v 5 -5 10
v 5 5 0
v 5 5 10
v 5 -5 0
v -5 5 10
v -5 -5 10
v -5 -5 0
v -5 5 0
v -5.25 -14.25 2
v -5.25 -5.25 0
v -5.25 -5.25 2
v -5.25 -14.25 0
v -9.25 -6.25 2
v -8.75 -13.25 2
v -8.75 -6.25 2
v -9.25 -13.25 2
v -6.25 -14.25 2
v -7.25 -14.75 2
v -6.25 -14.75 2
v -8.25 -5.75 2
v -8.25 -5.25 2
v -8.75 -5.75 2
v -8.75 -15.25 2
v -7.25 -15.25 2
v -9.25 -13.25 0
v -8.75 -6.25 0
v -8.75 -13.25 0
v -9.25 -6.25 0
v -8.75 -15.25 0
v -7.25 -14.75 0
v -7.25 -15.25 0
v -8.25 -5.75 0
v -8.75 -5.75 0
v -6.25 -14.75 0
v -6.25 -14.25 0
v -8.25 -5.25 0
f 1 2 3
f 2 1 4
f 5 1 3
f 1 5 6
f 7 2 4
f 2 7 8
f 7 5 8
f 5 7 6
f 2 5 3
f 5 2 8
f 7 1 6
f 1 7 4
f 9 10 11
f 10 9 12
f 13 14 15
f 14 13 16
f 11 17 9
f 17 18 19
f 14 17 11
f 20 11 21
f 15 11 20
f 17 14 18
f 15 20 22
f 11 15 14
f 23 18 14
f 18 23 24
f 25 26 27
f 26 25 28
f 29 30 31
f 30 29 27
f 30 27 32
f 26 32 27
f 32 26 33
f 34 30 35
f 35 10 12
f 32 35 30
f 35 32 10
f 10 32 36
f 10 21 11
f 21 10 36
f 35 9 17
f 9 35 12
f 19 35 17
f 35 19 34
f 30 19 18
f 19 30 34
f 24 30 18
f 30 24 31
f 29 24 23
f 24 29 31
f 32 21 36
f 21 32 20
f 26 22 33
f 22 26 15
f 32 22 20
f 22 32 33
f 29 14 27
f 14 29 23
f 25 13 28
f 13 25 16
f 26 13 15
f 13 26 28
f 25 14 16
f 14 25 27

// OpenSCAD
translate([0, 0, 5]) color([0,1,0,0.9]) cube([10, 10, 10], center=true);
translate([-5.5, -5.5, 1]) color([1,0,0]) cube([0.5, 0.5, 2], center=true);
translate([-5.5, -6.0, 1]) color([1,0,0]) cube([0.5, 0.5, 2], center=true);
translate([-5.5, -6.5, 1]) color([1,0,0]) cube([0.5, 0.5, 2], center=true);
translate([-5.5, -7.0, 1]) color([1,0,0]) cube([0.5, 0.5, 2], center=true);
translate([-5.5, -7.5, 1]) color([1,0,0]) cube([0.5, 0.5, 2], center=true);
translate([-5.5, -8.0, 1]) color([1,0,0]) cube([0.5, 0.5, 2], center=true);
translate([-5.5, -8.5, 1]) color([1,0,0]) cube([0.5, 0.5, 2], center=true);
translate([-5.5, -9.0, 1]) color([1,0,0]) cube([0.5, 0.5, 2], center=true);
translate([-5.5, -9.5, 1]) color([1,0,0]) cube([0.5, 0.5, 2], center=true);
translate([-5.5, -10.0, 1]) color([1,0,0]) cube([0.5, 0.5, 2], center=true);
translate([-5.5, -10.5, 1]) color([1,0,0]) cube([0.5, 0.5, 2], center=true);
translate([-5.5, -11.0, 1]) color([1,0,0]) cube([0.5, 0.5, 2], center=true);
translate([-5.5, -11.5, 1]) color([1,0,0]) cube([0.5, 0.5, 2], center=true);
translate([-5.5, -12.0, 1]) color([1,0,0]) cube([0.5, 0.5, 2], center=true);
translate([-5.5, -12.5, 1]) color([1,0,0]) cube([0.5, 0.5, 2], center=true);
translate([-5.5, -13.0, 1]) color([1,0,0]) cube([0.5, 0.5, 2], center=true);
translate([-5.5, -13.5, 1]) color([1,0,0]) cube([0.5, 0.5, 2], center=true);
translate([-5.5, -14.0, 1]) color([1,0,0]) cube([0.5, 0.5, 2], center=true);
translate([-6.0, -5.5, 1]) color([1,0,0]) cube([0.5, 0.5, 2], center=true);
translate([-6.0, -6.0, 1]) color([1,0,0]) cube([0.5, 0.5, 2], center=true);
translate([-6.0, -6.5, 1]) color([1,0,0]) cube([0.5, 0.5, 2], center=true);
translate([-6.0, -7.0, 1]) color([1,0,0]) cube([0.5, 0.5, 2], center=true);
translate([-6.0, -7.5, 1]) color([1,0,0]) cube([0.5, 0.5, 2], center=true);
translate([-6.0, -8.0, 1]) color([1,0,0]) cube([0.5, 0.5, 2], center=true);
translate([-6.0, -8.5, 1]) color([1,0,0]) cube([0.5, 0.5, 2], center=true);
translate([-6.0, -9.0, 1]) color([1,0,0]) cube([0.5, 0.5, 2], center=true);
translate([-6.0, -9.5, 1]) color([1,0,0]) cube([0.5, 0.5, 2], center=true);
translate([-6.0, -10.0, 1]) color([1,0,0]) cube([0.5, 0.5, 2], center=true);
translate([-6.0, -10.5, 1]) color([1,0,0]) cube([0.5, 0.5, 2], center=true);
translate([-6.0, -11.0, 1]) color([1,0,0]) cube([0.5, 0.5, 2], center=true);
translate([-6.0, -11.5, 1]) color([1,0,0]) cube([0.5, 0.5, 2], center=true);
translate([-6.0, -12.0, 1]) color([1,0,0]) cube([0.5, 0.5, 2], center=true);
translate([-6.0, -12.5, 1]) color([1,0,0]) cube([0.5, 0.5, 2], center=true);
translate([-6.0, -13.0, 1]) color([1,0,0]) cube([0.5, 0.5, 2], center=true);
translate([-6.0, -13.5, 1]) color([1,0,0]) cube([0.5, 0.5, 2], center=true);
translate([-6.0, -14.0, 1]) color([1,0,0]) cube([0.5, 0.5, 2], center=true);
translate([-6.5, -5.5, 1]) color([1,0,0]) cube([0.5, 0.5, 2], center=true);
translate([-6.5, -6.0, 1]) color([1,0,0]) cube([0.5, 0.5, 2], center=true);
translate([-6.5, -6.5, 1]) color([1,0,0]) cube([0.5, 0.5, 2], center=true);
translate([-6.5, -7.0, 1]) color([1,0,0]) cube([0.5, 0.5, 2], center=true);
translate([-6.5, -7.5, 1]) color([1,0,0]) cube([0.5, 0.5, 2], center=true);
translate([-6.5, -8.0, 1]) color([1,0,0]) cube([0.5, 0.5, 2], center=true);
translate([-6.5, -8.5, 1]) color([1,0,0]) cube([0.5, 0.5, 2], center=true);
translate([-6.5, -9.0, 1]) color([1,0,0]) cube([0.5, 0.5, 2], center=true);
translate([-6.5, -9.5, 1]) color([1,0,0]) cube([0.5, 0.5, 2], center=true);
translate([-6.5, -10.0, 1]) color([1,0,0]) cube([0.5, 0.5, 2], center=true);
translate([-6.5, -10.5, 1]) color([1,0,0]) cube([0.5, 0.5, 2], center=true);
translate([-6.5, -11.0, 1]) color([1,0,0]) cube([0.5, 0.5, 2], center=true);
translate([-6.5, -11.5, 1]) color([1,0,0]) cube([0.5, 0.5, 2], center=true);
translate([-6.5, -12.0, 1]) color([1,0,0]) cube([0.5, 0.5, 2], center=true);
translate([-6.5, -12.5, 1]) color([1,0,0]) cube([0.5, 0.5, 2], center=true);
translate([-6.5, -13.0, 1]) color([1,0,0]) cube([0.5, 0.5, 2], center=true);
translate([-6.5, -13.5, 1]) color([1,0,0]) cube([0.5, 0.5, 2], center=true);
translate([-6.5, -14.0, 1]) color([1,0,0]) cube([0.5, 0.5, 2], center=true);
translate([-6.5, -14.5, 1]) color([1,0,0]) cube([0.5, 0.5, 2], center=true);
translate([-7.0, -5.5, 1]) color([1,0,0]) cube([0.5, 0.5, 2], center=true);
translate([-7.0, -6.0, 1]) color([1,0,0]) cube([0.5, 0.5, 2], center=true);
translate([-7.0, -6.5, 1]) color([1,0,0]) cube([0.5, 0.5, 2], center=true);
translate([-7.0, -7.0, 1]) color([1,0,0]) cube([0.5, 0.5, 2], center=true);
translate([-7.0, -7.5, 1]) color([1,0,0]) cube([0.5, 0.5, 2], center=true);
translate([-7.0, -8.0, 1]) color([1,0,0]) cube([0.5, 0.5, 2], center=true);
translate([-7.0, -8.5, 1]) color([1,0,0]) cube([0.5, 0.5, 2], center=true);
translate([-7.0, -9.0, 1]) color([1,0,0]) cube([0.5, 0.5, 2], center=true);
translate([-7.0, -9.5, 1]) color([1,0,0]) cube([0.5, 0.5, 2], center=true);
translate([-7.0, -10.0, 1]) color([1,0,0]) cube([0.5, 0.5, 2], center=true);
translate([-7.0, -10.5, 1]) color([1,0,0]) cube([0.5, 0.5, 2], center=true);
translate([-7.0, -11.0, 1]) color([1,0,0]) cube([0.5, 0.5, 2], center=true);
translate([-7.0, -11.5, 1]) color([1,0,0]) cube([0.5, 0.5, 2], center=true);
translate([-7.0, -12.0, 1]) color([1,0,0]) cube([0.5, 0.5, 2], center=true);
translate([-7.0, -12.5, 1]) color([1,0,0]) cube([0.5, 0.5, 2], center=true);
translate([-7.0, -13.0, 1]) color([1,0,0]) cube([0.5, 0.5, 2], center=true);
translate([-7.0, -13.5, 1]) color([1,0,0]) cube([0.5, 0.5, 2], center=true);
translate([-7.0, -14.0, 1]) color([1,0,0]) cube([0.5, 0.5, 2], center=true);
translate([-7.0, -14.5, 1]) color([1,0,0]) cube([0.5, 0.5, 2], center=true);
translate([-7.5, -5.5, 1]) color([1,0,0]) cube([0.5, 0.5, 2], center=true);
translate([-7.5, -6.0, 1]) color([1,0,0]) cube([0.5, 0.5, 2], center=true);
translate([-7.5, -6.5, 1]) color([1,0,0]) cube([0.5, 0.5, 2], center=true);
translate([-7.5, -7.0, 1]) color([1,0,0]) cube([0.5, 0.5, 2], center=true);
translate([-7.5, -7.5, 1]) color([1,0,0]) cube([0.5, 0.5, 2], center=true);
translate([-7.5, -8.0, 1]) color([1,0,0]) cube([0.5, 0.5, 2], center=true);
translate([-7.5, -8.5, 1]) color([1,0,0]) cube([0.5, 0.5, 2], center=true);
translate([-7.5, -9.0, 1]) color([1,0,0]) cube([0.5, 0.5, 2], center=true);
translate([-7.5, -9.5, 1]) color([1,0,0]) cube([0.5, 0.5, 2], center=true);
translate([-7.5, -10.0, 1]) color([1,0,0]) cube([0.5, 0.5, 2], center=true);
translate([-7.5, -10.5, 1]) color([1,0,0]) cube([0.5, 0.5, 2], center=true);
translate([-7.5, -11.0, 1]) color([1,0,0]) cube([0.5, 0.5, 2], center=true);
translate([-7.5, -11.5, 1]) color([1,0,0]) cube([0.5, 0.5, 2], center=true);
translate([-7.5, -12.0, 1]) color([1,0,0]) cube([0.5, 0.5, 2], center=true);
translate([-7.5, -12.5, 1]) color([1,0,0]) cube([0.5, 0.5, 2], center=true);
translate([-7.5, -13.0, 1]) color([1,0,0]) cube([0.5, 0.5, 2], center=true);
translate([-7.5, -13.5, 1]) color([1,0,0]) cube([0.5, 0.5, 2], center=true);
translate([-7.5, -14.0, 1]) color([1,0,0]) cube([0.5, 0.5, 2], center=true);
translate([-7.5, -14.5, 1]) color([1,0,0]) cube([0.5, 0.5, 2], center=true);
translate([-7.5, -15.0, 1]) color([1,0,0]) cube([0.5, 0.5, 2], center=true);
translate([-8.0, -5.5, 1]) color([1,0,0]) cube([0.5, 0.5, 2], center=true);
translate([-8.0, -6.0, 1]) color([1,0,0]) cube([0.5, 0.5, 2], center=true);
translate([-8.0, -6.5, 1]) color([1,0,0]) cube([0.5, 0.5, 2], center=true);
translate([-8.0, -7.0, 1]) color([1,0,0]) cube([0.5, 0.5, 2], center=true);
translate([-8.0, -7.5, 1]) color([1,0,0]) cube([0.5, 0.5, 2], center=true);
translate([-8.0, -8.0, 1]) color([1,0,0]) cube([0.5, 0.5, 2], center=true);
translate([-8.0, -8.5, 1]) color([1,0,0]) cube([0.5, 0.5, 2], center=true);
translate([-8.0, -9.0, 1]) color([1,0,0]) cube([0.5, 0.5, 2], center=true);
translate([-8.0, -9.5, 1]) color([1,0,0]) cube([0.5, 0.5, 2], center=true);
translate([-8.0, -10.0, 1]) color([1,0,0]) cube([0.5, 0.5, 2], center=true);
translate([-8.0, -10.5, 1]) color([1,0,0]) cube([0.5, 0.5, 2], center=true);
translate([-8.0, -11.0, 1]) color([1,0,0]) cube([0.5, 0.5, 2], center=true);
translate([-8.0, -11.5, 1]) color([1,0,0]) cube([0.5, 0.5, 2], center=true);
translate([-8.0, -12.0, 1]) color([1,0,0]) cube([0.5, 0.5, 2], center=true);
translate([-8.0, -12.5, 1]) color([1,0,0]) cube([0.5, 0.5, 2], center=true);
translate([-8.0, -13.0, 1]) color([1,0,0]) cube([0.5, 0.5, 2], center=true);
translate([-8.0, -13.5, 1]) color([1,0,0]) cube([0.5, 0.5, 2], center=true);
translate([-8.0, -14.0, 1]) color([1,0,0]) cube([0.5, 0.5, 2], center=true);
translate([-8.0, -14.5, 1]) color([1,0,0]) cube([0.5, 0.5, 2], center=true);
translate([-8.0, -15.0, 1]) color([1,0,0]) cube([0.5, 0.5, 2], center=true);
translate([-8.5, -6.0, 1]) color([1,0,0]) cube([0.5, 0.5, 2], center=true);
translate([-8.5, -6.5, 1]) color([1,0,0]) cube([0.5, 0.5, 2], center=true);
translate([-8.5, -7.0, 1]) color([1,0,0]) cube([0.5, 0.5, 2], center=true);
translate([-8.5, -7.5, 1]) color([1,0,0]) cube([0.5, 0.5, 2], center=true);
translate([-8.5, -8.0, 1]) color([1,0,0]) cube([0.5, 0.5, 2], center=true);
translate([-8.5, -8.5, 1]) color([1,0,0]) cube([0.5, 0.5, 2], center=true);
translate([-8.5, -9.0, 1]) color([1,0,0]) cube([0.5, 0.5, 2], center=true);
translate([-8.5, -9.5, 1]) color([1,0,0]) cube([0.5, 0.5, 2], center=true);
translate([-8.5, -10.0, 1]) color([1,0,0]) cube([0.5, 0.5, 2], center=true);
translate([-8.5, -10.5, 1]) color([1,0,0]) cube([0.5, 0.5, 2], center=true);
translate([-8.5, -11.0, 1]) color([1,0,0]) cube([0.5, 0.5, 2], center=true);
translate([-8.5, -11.5, 1]) color([1,0,0]) cube([0.5, 0.5, 2], center=true);
translate([-8.5, -12.0, 1]) color([1,0,0]) cube([0.5, 0.5, 2], center=true);
translate([-8.5, -12.5, 1]) color([1,0,0]) cube([0.5, 0.5, 2], center=true);
translate([-8.5, -13.0, 1]) color([1,0,0]) cube([0.5, 0.5, 2], center=true);
translate([-8.5, -13.5, 1]) color([1,0,0]) cube([0.5, 0.5, 2], center=true);
translate([-8.5, -14.0, 1]) color([1,0,0]) cube([0.5, 0.5, 2], center=true);
translate([-8.5, -14.5, 1]) color([1,0,0]) cube([0.5, 0.5, 2], center=true);
translate([-8.5, -15.0, 1]) color([1,0,0]) cube([0.5, 0.5, 2], center=true);
translate([-9.0, -6.5, 1]) color([1,0,0]) cube([0.5, 0.5, 2], center=true);
translate([-9.0, -7.0, 1]) color([1,0,0]) cube([0.5, 0.5, 2], center=true);
translate([-9.0, -7.5, 1]) color([1,0,0]) cube([0.5, 0.5, 2], center=true);
translate([-9.0, -8.0, 1]) color([1,0,0]) cube([0.5, 0.5, 2], center=true);
translate([-9.0, -8.5, 1]) color([1,0,0]) cube([0.5, 0.5, 2], center=true);
translate([-9.0, -9.0, 1]) color([1,0,0]) cube([0.5, 0.5, 2], center=true);
translate([-9.0, -9.5, 1]) color([1,0,0]) cube([0.5, 0.5, 2], center=true);
translate([-9.0, -10.0, 1]) color([1,0,0]) cube([0.5, 0.5, 2], center=true);
translate([-9.0, -10.5, 1]) color([1,0,0]) cube([0.5, 0.5, 2], center=true);
translate([-9.0, -11.0, 1]) color([1,0,0]) cube([0.5, 0.5, 2], center=true);
translate([-9.0, -11.5, 1]) color([1,0,0]) cube([0.5, 0.5, 2], center=true);
translate([-9.0, -12.0, 1]) color([1,0,0]) cube([0.5, 0.5, 2], center=true);
translate([-9.0, -12.5, 1]) color([1,0,0]) cube([0.5, 0.5, 2], center=true);
translate([-9.0, -13.0, 1]) color([1,0,0]) cube([0.5, 0.5, 2], center=true);
